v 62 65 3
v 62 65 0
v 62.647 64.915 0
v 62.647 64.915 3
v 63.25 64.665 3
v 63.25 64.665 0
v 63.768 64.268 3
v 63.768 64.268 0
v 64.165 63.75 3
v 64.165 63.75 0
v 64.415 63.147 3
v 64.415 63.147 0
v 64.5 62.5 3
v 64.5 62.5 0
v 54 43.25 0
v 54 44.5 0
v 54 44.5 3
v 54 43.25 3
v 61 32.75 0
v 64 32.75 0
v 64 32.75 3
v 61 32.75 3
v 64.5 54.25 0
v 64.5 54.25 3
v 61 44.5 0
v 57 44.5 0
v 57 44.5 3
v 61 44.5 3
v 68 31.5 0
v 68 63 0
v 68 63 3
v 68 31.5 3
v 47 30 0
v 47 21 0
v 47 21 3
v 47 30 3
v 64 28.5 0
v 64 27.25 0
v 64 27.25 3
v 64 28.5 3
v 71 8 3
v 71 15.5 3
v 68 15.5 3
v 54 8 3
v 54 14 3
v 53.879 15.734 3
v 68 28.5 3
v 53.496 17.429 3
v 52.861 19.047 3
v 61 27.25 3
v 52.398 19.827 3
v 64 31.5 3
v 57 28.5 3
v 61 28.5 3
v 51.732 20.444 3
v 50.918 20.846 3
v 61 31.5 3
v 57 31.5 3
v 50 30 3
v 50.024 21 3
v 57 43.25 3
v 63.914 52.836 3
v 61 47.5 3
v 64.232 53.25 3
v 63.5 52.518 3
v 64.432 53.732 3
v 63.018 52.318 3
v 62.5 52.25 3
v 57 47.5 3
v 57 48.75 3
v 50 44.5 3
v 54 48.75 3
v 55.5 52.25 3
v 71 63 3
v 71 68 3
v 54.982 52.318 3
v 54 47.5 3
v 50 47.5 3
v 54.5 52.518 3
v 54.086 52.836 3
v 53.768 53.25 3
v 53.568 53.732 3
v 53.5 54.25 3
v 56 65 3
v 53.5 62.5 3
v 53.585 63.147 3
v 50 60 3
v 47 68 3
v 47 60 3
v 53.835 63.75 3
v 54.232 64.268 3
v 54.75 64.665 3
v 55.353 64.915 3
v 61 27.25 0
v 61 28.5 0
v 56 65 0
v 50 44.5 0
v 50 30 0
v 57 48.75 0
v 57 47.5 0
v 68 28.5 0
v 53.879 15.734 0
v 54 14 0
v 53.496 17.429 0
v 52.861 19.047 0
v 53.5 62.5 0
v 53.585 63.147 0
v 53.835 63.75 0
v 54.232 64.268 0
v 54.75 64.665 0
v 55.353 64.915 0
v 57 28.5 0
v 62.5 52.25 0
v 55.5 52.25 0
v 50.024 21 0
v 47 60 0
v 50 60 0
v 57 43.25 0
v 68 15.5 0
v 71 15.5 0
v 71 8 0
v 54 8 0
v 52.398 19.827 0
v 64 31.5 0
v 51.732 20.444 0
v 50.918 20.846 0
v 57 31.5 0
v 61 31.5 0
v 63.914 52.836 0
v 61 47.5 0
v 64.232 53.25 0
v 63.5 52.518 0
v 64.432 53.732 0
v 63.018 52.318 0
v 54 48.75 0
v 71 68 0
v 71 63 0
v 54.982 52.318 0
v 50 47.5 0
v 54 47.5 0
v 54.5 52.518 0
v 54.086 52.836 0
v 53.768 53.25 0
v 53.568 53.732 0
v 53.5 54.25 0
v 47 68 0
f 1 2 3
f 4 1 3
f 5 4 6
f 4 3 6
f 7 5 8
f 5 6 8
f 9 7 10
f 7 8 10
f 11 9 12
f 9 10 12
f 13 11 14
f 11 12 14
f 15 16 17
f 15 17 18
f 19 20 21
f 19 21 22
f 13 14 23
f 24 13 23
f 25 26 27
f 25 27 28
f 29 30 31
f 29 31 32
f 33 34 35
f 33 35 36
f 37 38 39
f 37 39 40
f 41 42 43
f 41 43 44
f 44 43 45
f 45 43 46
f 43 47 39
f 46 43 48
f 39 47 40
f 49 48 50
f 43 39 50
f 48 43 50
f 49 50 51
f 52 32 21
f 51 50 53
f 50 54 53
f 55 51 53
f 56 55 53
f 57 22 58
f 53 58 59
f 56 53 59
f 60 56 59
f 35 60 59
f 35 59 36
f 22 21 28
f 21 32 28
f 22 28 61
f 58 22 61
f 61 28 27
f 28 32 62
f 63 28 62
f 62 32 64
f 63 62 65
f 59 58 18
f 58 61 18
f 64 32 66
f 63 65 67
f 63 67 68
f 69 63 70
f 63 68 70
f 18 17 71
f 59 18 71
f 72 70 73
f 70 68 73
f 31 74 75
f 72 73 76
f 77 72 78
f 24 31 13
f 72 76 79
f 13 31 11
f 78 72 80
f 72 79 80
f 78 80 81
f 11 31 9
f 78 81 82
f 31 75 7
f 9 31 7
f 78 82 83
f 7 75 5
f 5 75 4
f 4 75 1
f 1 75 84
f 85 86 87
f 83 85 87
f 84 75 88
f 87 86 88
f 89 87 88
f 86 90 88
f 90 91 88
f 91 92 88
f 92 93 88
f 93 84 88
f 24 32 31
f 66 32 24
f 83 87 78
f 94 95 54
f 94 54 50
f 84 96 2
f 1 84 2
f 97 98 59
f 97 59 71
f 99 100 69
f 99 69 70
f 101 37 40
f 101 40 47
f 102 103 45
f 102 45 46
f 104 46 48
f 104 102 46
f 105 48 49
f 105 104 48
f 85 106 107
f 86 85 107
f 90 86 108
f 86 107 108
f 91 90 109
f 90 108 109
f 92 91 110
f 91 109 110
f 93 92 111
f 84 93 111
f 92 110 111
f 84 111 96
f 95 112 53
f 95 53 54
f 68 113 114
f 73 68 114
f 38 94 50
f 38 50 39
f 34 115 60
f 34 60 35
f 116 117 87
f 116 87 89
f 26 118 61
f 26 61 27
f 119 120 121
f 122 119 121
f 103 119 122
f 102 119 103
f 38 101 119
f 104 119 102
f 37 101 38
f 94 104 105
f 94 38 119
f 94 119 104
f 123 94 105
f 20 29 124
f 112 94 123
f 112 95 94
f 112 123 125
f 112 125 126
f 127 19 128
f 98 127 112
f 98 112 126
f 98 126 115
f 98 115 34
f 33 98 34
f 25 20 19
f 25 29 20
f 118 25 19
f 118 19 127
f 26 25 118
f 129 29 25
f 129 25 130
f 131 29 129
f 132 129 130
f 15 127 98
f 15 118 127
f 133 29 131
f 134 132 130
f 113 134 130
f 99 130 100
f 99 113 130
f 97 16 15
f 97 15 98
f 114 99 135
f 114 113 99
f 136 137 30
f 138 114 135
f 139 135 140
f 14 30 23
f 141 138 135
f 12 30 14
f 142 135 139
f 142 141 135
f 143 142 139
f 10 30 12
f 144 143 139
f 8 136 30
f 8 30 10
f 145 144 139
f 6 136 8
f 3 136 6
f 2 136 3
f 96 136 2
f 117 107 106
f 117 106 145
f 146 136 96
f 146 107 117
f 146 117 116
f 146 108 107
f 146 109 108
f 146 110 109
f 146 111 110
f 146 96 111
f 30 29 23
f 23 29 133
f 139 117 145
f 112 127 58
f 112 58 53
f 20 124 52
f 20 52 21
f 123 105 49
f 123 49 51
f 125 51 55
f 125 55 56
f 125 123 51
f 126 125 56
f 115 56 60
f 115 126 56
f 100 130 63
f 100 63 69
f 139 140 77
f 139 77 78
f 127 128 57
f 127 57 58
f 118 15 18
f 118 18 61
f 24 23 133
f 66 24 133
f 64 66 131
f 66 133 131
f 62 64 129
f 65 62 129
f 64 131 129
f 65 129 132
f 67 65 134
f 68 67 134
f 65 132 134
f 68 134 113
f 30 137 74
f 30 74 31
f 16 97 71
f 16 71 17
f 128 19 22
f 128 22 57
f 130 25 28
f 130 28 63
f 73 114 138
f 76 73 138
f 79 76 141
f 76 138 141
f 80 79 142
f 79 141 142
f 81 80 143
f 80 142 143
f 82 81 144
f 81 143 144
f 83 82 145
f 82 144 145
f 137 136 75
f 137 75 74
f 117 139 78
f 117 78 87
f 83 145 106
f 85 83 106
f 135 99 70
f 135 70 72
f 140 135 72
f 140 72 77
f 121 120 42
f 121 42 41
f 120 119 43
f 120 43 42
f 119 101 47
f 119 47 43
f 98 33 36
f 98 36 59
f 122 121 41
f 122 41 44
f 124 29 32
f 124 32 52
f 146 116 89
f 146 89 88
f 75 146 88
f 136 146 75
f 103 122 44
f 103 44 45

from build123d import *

# Parameters (mm, degrees)
BOSS_EXTRUDE1_DEPTH = 3


with BuildPart() as part:
    # Model → Boss-Extrude1 (new body)
    with BuildSketch(Plane.XY):
        with BuildLine():
            Line((71, 68), (71, 63))
            Line((71, 63), (68, 63))
            Line((68, 63), (68, 31.5))
            Line((68, 31.5), (64, 31.5))
            Line((64, 31.5), (64, 32.75))
            Line((64, 32.75), (61, 32.75))
            Line((61, 32.75), (61, 31.5))
            Line((61, 31.5), (57, 31.5))
            Line((57, 31.5), (57, 28.5))
            Line((57, 28.5), (61, 28.5))
            Line((61, 28.5), (61, 27.25))
            Line((61, 27.25), (64, 27.25))
            Line((64, 27.25), (64, 28.5))
            Line((64, 28.5), (68, 28.5))
            Line((68, 28.5), (68, 15.5))
            Line((68, 15.5), (71, 15.5))
            Line((71, 15.5), (71, 8))
            Line((71, 8), (54, 8))
            Line((54, 8), (54, 14))
            ThreePointArc((54, 14), (53.719770148, 16.588625278), (52.861029282, 19.046688281))
            ThreePointArc((52.861029282, 19.046688281), (51.73197083, 20.444193402), (50.0235, 21))
            Line((50.0235, 21), (47, 21))
            Line((47, 21), (47, 30))
            Line((47, 30), (50, 30))
            Line((50, 30), (50, 44.5))
            Line((50, 44.5), (54, 44.5))
            Line((54, 44.5), (54, 43.25))
            Line((54, 43.25), (57, 43.25))
            Line((57, 43.25), (57, 44.5))
            Line((57, 44.5), (61, 44.5))
            Line((61, 44.5), (61, 47.5))
            Line((61, 47.5), (57, 47.5))
            Line((57, 47.5), (57, 48.75))
            Line((57, 48.75), (54, 48.75))
            Line((54, 48.75), (54, 47.5))
            Line((54, 47.5), (50, 47.5))
            Line((50, 47.5), (50, 60))
            Line((50, 60), (47, 60))
            Line((47, 60), (47, 68))
            Line((47, 68), (71, 68))
        make_face()
        with BuildLine():
            Line((56, 65), (62, 65))
            ThreePointArc((62, 65), (63.76778125, 64.26778125), (64.5, 62.5))
            Line((64.5, 62.5), (64.5, 54.25))
            ThreePointArc((64.5, 54.25), (63.914214645, 52.835814644), (62.5, 52.2501))
            Line((62.5, 52.2501), (55.5, 52.2501))
            ThreePointArc((55.5, 52.2501), (54.085735358, 52.835764643), (53.5, 54.25))
            Line((53.5, 54.25), (53.5, 62.5))
            ThreePointArc((53.5, 62.5), (54.2322, 64.2678), (56, 65))
        make_face(mode=Mode.SUBTRACT)
    extrude(amount=BOSS_EXTRUDE1_DEPTH)


solid = part.part
